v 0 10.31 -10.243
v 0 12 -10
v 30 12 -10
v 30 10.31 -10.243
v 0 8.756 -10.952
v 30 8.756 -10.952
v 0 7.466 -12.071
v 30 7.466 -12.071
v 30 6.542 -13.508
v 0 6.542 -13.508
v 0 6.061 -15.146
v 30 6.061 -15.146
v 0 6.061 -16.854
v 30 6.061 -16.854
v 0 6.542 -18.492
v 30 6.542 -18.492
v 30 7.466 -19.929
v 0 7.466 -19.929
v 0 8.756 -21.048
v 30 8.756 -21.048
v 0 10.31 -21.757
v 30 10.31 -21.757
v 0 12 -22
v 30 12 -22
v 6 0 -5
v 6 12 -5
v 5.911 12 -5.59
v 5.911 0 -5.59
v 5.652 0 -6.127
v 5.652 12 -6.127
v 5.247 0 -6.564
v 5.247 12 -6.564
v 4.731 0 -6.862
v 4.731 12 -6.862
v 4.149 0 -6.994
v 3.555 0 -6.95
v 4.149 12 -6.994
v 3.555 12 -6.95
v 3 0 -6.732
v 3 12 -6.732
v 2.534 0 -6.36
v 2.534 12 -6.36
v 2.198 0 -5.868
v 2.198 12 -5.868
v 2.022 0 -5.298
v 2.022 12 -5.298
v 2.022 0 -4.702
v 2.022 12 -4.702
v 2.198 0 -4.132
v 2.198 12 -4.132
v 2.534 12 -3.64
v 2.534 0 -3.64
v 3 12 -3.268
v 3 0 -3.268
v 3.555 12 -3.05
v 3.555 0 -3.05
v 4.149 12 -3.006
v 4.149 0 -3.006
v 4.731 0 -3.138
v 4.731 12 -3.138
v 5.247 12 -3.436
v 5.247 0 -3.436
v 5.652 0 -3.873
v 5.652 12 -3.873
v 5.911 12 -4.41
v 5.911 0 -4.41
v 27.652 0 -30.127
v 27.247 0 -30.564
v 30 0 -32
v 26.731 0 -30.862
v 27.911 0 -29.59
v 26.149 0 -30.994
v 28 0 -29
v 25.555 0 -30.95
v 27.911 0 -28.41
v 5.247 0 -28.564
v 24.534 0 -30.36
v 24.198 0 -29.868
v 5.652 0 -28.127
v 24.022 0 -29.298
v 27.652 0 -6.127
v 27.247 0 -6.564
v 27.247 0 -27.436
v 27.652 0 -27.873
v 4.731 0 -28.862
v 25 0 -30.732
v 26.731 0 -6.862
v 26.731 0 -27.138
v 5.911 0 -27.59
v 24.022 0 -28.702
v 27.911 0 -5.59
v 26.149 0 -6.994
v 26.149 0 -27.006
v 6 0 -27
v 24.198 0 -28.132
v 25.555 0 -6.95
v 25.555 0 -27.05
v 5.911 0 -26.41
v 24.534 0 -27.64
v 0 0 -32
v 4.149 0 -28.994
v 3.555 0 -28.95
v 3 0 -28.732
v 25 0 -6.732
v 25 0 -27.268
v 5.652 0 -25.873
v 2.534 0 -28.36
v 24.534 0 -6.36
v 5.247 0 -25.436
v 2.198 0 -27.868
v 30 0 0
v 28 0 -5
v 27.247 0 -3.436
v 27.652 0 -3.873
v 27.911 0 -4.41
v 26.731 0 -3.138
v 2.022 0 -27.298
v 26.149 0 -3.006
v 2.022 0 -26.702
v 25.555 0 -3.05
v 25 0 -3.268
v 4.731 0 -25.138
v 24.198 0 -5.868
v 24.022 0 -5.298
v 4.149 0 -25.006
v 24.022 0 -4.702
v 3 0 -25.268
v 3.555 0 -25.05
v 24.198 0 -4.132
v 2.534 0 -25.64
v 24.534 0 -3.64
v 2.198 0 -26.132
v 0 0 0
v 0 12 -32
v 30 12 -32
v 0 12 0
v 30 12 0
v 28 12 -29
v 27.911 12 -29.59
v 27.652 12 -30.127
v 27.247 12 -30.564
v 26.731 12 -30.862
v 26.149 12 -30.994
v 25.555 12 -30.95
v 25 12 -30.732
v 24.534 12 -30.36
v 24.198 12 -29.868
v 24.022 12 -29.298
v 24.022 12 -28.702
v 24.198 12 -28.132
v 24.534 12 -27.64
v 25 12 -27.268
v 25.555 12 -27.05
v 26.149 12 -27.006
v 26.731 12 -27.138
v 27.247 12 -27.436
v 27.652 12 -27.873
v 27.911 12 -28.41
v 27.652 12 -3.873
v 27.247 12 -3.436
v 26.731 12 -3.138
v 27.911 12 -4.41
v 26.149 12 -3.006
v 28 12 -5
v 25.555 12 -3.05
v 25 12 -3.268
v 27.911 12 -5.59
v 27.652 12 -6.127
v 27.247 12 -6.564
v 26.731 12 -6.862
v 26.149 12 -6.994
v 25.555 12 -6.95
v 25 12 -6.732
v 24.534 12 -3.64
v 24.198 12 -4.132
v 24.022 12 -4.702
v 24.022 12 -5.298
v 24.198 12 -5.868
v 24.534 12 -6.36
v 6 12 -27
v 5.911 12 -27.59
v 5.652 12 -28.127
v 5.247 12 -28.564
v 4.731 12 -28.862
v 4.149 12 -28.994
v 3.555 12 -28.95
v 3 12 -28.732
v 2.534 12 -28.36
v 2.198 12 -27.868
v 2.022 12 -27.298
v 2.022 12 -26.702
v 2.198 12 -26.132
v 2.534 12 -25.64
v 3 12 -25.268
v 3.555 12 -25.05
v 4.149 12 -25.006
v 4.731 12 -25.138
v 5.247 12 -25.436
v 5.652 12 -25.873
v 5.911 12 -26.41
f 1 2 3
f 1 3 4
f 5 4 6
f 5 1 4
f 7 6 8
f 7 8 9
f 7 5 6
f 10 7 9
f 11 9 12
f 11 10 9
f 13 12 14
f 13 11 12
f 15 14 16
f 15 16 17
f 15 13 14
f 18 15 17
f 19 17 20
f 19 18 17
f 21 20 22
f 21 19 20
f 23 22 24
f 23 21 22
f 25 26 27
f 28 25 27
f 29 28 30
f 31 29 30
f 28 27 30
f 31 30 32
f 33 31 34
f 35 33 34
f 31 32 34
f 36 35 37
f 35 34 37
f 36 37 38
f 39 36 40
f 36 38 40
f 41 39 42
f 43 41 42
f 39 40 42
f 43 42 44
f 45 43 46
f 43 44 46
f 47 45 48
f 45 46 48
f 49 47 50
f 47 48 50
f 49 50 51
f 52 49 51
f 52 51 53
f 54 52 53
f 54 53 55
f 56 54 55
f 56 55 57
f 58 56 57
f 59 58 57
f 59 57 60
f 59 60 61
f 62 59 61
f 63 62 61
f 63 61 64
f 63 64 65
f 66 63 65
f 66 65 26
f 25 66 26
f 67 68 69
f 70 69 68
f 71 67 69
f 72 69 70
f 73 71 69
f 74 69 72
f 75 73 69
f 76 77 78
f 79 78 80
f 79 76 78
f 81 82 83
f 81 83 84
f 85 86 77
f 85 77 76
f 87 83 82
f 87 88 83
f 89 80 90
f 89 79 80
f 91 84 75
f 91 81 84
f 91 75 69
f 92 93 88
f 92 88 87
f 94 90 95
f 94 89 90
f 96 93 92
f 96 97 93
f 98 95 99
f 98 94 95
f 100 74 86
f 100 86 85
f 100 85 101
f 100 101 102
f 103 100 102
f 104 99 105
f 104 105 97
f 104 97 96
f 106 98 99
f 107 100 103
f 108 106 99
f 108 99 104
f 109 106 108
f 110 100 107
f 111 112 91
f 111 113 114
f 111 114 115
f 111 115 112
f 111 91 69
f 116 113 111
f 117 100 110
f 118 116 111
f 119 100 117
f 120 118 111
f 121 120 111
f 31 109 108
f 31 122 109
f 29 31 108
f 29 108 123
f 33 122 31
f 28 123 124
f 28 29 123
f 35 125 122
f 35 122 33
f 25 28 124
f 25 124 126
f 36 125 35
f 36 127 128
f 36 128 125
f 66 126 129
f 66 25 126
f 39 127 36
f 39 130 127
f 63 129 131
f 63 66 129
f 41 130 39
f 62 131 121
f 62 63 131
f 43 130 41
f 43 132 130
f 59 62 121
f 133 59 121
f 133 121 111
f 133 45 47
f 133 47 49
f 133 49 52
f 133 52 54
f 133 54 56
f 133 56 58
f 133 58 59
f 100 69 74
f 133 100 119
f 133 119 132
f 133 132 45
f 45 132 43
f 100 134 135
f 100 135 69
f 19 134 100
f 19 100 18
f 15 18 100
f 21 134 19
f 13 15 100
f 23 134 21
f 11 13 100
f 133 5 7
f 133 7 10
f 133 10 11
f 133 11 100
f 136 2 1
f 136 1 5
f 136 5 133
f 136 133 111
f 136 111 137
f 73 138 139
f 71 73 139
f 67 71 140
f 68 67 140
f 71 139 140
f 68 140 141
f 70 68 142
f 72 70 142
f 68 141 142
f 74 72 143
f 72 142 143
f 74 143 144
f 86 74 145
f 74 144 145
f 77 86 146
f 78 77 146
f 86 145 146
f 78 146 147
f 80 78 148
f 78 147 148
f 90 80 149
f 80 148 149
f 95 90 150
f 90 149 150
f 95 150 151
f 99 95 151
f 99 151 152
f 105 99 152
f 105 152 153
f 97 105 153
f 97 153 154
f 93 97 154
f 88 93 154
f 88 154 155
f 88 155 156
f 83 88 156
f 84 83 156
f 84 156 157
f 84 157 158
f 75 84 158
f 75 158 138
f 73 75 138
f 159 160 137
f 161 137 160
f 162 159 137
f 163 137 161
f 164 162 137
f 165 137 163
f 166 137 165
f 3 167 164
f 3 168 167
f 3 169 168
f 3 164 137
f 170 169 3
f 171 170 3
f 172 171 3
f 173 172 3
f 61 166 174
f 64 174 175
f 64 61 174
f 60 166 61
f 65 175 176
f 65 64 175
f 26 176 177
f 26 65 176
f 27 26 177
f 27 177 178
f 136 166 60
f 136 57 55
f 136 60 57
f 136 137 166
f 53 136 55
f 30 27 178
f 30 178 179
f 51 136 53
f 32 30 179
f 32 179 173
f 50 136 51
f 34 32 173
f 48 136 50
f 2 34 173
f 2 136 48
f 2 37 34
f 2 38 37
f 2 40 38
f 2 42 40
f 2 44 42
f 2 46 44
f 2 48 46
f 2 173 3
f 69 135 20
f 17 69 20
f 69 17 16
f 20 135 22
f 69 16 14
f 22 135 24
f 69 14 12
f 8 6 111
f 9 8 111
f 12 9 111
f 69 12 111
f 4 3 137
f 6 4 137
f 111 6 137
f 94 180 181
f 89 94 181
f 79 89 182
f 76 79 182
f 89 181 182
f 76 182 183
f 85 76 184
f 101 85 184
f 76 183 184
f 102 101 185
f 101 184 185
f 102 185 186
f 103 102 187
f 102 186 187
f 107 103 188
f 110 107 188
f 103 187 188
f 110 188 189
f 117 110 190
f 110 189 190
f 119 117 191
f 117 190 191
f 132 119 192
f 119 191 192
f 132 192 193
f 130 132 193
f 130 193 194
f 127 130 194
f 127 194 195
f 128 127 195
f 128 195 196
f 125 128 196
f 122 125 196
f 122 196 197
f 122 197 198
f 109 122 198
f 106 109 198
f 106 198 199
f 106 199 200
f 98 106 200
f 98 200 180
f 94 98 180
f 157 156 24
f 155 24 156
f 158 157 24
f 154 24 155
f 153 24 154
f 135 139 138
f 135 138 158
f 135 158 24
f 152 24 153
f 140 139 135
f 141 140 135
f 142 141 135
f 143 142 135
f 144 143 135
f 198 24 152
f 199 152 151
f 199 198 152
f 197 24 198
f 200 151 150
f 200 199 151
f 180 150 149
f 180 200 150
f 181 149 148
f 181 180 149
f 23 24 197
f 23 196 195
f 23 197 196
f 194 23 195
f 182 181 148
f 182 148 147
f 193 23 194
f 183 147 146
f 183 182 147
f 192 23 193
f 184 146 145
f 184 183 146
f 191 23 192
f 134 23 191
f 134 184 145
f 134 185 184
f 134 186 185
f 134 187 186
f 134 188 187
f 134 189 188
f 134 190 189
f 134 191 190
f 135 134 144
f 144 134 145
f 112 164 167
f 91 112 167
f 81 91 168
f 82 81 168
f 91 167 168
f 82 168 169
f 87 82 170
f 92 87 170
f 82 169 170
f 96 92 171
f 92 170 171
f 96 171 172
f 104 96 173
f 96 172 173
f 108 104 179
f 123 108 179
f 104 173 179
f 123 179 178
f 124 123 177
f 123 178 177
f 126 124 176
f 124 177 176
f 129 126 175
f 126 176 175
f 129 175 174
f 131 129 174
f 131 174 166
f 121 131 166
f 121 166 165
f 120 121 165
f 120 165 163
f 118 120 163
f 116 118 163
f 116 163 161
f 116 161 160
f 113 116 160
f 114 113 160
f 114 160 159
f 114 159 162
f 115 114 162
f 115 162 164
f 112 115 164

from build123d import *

# Parameters (mm, degrees)
BOSS_EXTRUDE1_DEPTH = 30
SKETCH2_R           = 2
CUT_EXTRUDE1_DEPTH  = 13


with BuildPart() as part:
    # Sketch1 → Boss-Extrude1 (new body)
    with BuildSketch(Plane(origin=(0, 0, 0), x_dir=(0, 0, -1), z_dir=(1, 0, 0))):
        with BuildLine():
            Line((0, 0), (0, 12))
            Line((0, 12), (10, 12))
            ThreePointArc((10, 12), (16, 6), (22, 12))
            Line((22, 12), (32, 12))
            Line((32, 12), (32, 0))
            Line((32, 0), (0, 0))
        make_face()
    extrude(amount=BOSS_EXTRUDE1_DEPTH)

    # Sketch2 → Cut-Extrude1 (cut, through all)
    with BuildSketch(Plane(origin=(0, 12, 0), x_dir=(1, 0, 0), z_dir=(0, 1, 0))):
        with Locations((4, 27)):
            Circle(SKETCH2_R)
        with Locations((26, 29)):
            Circle(SKETCH2_R)
        with Locations((4, 5)):
            Circle(SKETCH2_R)
        with Locations((26, 5)):
            Circle(SKETCH2_R)
    extrude(amount=-CUT_EXTRUDE1_DEPTH, mode=Mode.SUBTRACT)


solid = part.part
